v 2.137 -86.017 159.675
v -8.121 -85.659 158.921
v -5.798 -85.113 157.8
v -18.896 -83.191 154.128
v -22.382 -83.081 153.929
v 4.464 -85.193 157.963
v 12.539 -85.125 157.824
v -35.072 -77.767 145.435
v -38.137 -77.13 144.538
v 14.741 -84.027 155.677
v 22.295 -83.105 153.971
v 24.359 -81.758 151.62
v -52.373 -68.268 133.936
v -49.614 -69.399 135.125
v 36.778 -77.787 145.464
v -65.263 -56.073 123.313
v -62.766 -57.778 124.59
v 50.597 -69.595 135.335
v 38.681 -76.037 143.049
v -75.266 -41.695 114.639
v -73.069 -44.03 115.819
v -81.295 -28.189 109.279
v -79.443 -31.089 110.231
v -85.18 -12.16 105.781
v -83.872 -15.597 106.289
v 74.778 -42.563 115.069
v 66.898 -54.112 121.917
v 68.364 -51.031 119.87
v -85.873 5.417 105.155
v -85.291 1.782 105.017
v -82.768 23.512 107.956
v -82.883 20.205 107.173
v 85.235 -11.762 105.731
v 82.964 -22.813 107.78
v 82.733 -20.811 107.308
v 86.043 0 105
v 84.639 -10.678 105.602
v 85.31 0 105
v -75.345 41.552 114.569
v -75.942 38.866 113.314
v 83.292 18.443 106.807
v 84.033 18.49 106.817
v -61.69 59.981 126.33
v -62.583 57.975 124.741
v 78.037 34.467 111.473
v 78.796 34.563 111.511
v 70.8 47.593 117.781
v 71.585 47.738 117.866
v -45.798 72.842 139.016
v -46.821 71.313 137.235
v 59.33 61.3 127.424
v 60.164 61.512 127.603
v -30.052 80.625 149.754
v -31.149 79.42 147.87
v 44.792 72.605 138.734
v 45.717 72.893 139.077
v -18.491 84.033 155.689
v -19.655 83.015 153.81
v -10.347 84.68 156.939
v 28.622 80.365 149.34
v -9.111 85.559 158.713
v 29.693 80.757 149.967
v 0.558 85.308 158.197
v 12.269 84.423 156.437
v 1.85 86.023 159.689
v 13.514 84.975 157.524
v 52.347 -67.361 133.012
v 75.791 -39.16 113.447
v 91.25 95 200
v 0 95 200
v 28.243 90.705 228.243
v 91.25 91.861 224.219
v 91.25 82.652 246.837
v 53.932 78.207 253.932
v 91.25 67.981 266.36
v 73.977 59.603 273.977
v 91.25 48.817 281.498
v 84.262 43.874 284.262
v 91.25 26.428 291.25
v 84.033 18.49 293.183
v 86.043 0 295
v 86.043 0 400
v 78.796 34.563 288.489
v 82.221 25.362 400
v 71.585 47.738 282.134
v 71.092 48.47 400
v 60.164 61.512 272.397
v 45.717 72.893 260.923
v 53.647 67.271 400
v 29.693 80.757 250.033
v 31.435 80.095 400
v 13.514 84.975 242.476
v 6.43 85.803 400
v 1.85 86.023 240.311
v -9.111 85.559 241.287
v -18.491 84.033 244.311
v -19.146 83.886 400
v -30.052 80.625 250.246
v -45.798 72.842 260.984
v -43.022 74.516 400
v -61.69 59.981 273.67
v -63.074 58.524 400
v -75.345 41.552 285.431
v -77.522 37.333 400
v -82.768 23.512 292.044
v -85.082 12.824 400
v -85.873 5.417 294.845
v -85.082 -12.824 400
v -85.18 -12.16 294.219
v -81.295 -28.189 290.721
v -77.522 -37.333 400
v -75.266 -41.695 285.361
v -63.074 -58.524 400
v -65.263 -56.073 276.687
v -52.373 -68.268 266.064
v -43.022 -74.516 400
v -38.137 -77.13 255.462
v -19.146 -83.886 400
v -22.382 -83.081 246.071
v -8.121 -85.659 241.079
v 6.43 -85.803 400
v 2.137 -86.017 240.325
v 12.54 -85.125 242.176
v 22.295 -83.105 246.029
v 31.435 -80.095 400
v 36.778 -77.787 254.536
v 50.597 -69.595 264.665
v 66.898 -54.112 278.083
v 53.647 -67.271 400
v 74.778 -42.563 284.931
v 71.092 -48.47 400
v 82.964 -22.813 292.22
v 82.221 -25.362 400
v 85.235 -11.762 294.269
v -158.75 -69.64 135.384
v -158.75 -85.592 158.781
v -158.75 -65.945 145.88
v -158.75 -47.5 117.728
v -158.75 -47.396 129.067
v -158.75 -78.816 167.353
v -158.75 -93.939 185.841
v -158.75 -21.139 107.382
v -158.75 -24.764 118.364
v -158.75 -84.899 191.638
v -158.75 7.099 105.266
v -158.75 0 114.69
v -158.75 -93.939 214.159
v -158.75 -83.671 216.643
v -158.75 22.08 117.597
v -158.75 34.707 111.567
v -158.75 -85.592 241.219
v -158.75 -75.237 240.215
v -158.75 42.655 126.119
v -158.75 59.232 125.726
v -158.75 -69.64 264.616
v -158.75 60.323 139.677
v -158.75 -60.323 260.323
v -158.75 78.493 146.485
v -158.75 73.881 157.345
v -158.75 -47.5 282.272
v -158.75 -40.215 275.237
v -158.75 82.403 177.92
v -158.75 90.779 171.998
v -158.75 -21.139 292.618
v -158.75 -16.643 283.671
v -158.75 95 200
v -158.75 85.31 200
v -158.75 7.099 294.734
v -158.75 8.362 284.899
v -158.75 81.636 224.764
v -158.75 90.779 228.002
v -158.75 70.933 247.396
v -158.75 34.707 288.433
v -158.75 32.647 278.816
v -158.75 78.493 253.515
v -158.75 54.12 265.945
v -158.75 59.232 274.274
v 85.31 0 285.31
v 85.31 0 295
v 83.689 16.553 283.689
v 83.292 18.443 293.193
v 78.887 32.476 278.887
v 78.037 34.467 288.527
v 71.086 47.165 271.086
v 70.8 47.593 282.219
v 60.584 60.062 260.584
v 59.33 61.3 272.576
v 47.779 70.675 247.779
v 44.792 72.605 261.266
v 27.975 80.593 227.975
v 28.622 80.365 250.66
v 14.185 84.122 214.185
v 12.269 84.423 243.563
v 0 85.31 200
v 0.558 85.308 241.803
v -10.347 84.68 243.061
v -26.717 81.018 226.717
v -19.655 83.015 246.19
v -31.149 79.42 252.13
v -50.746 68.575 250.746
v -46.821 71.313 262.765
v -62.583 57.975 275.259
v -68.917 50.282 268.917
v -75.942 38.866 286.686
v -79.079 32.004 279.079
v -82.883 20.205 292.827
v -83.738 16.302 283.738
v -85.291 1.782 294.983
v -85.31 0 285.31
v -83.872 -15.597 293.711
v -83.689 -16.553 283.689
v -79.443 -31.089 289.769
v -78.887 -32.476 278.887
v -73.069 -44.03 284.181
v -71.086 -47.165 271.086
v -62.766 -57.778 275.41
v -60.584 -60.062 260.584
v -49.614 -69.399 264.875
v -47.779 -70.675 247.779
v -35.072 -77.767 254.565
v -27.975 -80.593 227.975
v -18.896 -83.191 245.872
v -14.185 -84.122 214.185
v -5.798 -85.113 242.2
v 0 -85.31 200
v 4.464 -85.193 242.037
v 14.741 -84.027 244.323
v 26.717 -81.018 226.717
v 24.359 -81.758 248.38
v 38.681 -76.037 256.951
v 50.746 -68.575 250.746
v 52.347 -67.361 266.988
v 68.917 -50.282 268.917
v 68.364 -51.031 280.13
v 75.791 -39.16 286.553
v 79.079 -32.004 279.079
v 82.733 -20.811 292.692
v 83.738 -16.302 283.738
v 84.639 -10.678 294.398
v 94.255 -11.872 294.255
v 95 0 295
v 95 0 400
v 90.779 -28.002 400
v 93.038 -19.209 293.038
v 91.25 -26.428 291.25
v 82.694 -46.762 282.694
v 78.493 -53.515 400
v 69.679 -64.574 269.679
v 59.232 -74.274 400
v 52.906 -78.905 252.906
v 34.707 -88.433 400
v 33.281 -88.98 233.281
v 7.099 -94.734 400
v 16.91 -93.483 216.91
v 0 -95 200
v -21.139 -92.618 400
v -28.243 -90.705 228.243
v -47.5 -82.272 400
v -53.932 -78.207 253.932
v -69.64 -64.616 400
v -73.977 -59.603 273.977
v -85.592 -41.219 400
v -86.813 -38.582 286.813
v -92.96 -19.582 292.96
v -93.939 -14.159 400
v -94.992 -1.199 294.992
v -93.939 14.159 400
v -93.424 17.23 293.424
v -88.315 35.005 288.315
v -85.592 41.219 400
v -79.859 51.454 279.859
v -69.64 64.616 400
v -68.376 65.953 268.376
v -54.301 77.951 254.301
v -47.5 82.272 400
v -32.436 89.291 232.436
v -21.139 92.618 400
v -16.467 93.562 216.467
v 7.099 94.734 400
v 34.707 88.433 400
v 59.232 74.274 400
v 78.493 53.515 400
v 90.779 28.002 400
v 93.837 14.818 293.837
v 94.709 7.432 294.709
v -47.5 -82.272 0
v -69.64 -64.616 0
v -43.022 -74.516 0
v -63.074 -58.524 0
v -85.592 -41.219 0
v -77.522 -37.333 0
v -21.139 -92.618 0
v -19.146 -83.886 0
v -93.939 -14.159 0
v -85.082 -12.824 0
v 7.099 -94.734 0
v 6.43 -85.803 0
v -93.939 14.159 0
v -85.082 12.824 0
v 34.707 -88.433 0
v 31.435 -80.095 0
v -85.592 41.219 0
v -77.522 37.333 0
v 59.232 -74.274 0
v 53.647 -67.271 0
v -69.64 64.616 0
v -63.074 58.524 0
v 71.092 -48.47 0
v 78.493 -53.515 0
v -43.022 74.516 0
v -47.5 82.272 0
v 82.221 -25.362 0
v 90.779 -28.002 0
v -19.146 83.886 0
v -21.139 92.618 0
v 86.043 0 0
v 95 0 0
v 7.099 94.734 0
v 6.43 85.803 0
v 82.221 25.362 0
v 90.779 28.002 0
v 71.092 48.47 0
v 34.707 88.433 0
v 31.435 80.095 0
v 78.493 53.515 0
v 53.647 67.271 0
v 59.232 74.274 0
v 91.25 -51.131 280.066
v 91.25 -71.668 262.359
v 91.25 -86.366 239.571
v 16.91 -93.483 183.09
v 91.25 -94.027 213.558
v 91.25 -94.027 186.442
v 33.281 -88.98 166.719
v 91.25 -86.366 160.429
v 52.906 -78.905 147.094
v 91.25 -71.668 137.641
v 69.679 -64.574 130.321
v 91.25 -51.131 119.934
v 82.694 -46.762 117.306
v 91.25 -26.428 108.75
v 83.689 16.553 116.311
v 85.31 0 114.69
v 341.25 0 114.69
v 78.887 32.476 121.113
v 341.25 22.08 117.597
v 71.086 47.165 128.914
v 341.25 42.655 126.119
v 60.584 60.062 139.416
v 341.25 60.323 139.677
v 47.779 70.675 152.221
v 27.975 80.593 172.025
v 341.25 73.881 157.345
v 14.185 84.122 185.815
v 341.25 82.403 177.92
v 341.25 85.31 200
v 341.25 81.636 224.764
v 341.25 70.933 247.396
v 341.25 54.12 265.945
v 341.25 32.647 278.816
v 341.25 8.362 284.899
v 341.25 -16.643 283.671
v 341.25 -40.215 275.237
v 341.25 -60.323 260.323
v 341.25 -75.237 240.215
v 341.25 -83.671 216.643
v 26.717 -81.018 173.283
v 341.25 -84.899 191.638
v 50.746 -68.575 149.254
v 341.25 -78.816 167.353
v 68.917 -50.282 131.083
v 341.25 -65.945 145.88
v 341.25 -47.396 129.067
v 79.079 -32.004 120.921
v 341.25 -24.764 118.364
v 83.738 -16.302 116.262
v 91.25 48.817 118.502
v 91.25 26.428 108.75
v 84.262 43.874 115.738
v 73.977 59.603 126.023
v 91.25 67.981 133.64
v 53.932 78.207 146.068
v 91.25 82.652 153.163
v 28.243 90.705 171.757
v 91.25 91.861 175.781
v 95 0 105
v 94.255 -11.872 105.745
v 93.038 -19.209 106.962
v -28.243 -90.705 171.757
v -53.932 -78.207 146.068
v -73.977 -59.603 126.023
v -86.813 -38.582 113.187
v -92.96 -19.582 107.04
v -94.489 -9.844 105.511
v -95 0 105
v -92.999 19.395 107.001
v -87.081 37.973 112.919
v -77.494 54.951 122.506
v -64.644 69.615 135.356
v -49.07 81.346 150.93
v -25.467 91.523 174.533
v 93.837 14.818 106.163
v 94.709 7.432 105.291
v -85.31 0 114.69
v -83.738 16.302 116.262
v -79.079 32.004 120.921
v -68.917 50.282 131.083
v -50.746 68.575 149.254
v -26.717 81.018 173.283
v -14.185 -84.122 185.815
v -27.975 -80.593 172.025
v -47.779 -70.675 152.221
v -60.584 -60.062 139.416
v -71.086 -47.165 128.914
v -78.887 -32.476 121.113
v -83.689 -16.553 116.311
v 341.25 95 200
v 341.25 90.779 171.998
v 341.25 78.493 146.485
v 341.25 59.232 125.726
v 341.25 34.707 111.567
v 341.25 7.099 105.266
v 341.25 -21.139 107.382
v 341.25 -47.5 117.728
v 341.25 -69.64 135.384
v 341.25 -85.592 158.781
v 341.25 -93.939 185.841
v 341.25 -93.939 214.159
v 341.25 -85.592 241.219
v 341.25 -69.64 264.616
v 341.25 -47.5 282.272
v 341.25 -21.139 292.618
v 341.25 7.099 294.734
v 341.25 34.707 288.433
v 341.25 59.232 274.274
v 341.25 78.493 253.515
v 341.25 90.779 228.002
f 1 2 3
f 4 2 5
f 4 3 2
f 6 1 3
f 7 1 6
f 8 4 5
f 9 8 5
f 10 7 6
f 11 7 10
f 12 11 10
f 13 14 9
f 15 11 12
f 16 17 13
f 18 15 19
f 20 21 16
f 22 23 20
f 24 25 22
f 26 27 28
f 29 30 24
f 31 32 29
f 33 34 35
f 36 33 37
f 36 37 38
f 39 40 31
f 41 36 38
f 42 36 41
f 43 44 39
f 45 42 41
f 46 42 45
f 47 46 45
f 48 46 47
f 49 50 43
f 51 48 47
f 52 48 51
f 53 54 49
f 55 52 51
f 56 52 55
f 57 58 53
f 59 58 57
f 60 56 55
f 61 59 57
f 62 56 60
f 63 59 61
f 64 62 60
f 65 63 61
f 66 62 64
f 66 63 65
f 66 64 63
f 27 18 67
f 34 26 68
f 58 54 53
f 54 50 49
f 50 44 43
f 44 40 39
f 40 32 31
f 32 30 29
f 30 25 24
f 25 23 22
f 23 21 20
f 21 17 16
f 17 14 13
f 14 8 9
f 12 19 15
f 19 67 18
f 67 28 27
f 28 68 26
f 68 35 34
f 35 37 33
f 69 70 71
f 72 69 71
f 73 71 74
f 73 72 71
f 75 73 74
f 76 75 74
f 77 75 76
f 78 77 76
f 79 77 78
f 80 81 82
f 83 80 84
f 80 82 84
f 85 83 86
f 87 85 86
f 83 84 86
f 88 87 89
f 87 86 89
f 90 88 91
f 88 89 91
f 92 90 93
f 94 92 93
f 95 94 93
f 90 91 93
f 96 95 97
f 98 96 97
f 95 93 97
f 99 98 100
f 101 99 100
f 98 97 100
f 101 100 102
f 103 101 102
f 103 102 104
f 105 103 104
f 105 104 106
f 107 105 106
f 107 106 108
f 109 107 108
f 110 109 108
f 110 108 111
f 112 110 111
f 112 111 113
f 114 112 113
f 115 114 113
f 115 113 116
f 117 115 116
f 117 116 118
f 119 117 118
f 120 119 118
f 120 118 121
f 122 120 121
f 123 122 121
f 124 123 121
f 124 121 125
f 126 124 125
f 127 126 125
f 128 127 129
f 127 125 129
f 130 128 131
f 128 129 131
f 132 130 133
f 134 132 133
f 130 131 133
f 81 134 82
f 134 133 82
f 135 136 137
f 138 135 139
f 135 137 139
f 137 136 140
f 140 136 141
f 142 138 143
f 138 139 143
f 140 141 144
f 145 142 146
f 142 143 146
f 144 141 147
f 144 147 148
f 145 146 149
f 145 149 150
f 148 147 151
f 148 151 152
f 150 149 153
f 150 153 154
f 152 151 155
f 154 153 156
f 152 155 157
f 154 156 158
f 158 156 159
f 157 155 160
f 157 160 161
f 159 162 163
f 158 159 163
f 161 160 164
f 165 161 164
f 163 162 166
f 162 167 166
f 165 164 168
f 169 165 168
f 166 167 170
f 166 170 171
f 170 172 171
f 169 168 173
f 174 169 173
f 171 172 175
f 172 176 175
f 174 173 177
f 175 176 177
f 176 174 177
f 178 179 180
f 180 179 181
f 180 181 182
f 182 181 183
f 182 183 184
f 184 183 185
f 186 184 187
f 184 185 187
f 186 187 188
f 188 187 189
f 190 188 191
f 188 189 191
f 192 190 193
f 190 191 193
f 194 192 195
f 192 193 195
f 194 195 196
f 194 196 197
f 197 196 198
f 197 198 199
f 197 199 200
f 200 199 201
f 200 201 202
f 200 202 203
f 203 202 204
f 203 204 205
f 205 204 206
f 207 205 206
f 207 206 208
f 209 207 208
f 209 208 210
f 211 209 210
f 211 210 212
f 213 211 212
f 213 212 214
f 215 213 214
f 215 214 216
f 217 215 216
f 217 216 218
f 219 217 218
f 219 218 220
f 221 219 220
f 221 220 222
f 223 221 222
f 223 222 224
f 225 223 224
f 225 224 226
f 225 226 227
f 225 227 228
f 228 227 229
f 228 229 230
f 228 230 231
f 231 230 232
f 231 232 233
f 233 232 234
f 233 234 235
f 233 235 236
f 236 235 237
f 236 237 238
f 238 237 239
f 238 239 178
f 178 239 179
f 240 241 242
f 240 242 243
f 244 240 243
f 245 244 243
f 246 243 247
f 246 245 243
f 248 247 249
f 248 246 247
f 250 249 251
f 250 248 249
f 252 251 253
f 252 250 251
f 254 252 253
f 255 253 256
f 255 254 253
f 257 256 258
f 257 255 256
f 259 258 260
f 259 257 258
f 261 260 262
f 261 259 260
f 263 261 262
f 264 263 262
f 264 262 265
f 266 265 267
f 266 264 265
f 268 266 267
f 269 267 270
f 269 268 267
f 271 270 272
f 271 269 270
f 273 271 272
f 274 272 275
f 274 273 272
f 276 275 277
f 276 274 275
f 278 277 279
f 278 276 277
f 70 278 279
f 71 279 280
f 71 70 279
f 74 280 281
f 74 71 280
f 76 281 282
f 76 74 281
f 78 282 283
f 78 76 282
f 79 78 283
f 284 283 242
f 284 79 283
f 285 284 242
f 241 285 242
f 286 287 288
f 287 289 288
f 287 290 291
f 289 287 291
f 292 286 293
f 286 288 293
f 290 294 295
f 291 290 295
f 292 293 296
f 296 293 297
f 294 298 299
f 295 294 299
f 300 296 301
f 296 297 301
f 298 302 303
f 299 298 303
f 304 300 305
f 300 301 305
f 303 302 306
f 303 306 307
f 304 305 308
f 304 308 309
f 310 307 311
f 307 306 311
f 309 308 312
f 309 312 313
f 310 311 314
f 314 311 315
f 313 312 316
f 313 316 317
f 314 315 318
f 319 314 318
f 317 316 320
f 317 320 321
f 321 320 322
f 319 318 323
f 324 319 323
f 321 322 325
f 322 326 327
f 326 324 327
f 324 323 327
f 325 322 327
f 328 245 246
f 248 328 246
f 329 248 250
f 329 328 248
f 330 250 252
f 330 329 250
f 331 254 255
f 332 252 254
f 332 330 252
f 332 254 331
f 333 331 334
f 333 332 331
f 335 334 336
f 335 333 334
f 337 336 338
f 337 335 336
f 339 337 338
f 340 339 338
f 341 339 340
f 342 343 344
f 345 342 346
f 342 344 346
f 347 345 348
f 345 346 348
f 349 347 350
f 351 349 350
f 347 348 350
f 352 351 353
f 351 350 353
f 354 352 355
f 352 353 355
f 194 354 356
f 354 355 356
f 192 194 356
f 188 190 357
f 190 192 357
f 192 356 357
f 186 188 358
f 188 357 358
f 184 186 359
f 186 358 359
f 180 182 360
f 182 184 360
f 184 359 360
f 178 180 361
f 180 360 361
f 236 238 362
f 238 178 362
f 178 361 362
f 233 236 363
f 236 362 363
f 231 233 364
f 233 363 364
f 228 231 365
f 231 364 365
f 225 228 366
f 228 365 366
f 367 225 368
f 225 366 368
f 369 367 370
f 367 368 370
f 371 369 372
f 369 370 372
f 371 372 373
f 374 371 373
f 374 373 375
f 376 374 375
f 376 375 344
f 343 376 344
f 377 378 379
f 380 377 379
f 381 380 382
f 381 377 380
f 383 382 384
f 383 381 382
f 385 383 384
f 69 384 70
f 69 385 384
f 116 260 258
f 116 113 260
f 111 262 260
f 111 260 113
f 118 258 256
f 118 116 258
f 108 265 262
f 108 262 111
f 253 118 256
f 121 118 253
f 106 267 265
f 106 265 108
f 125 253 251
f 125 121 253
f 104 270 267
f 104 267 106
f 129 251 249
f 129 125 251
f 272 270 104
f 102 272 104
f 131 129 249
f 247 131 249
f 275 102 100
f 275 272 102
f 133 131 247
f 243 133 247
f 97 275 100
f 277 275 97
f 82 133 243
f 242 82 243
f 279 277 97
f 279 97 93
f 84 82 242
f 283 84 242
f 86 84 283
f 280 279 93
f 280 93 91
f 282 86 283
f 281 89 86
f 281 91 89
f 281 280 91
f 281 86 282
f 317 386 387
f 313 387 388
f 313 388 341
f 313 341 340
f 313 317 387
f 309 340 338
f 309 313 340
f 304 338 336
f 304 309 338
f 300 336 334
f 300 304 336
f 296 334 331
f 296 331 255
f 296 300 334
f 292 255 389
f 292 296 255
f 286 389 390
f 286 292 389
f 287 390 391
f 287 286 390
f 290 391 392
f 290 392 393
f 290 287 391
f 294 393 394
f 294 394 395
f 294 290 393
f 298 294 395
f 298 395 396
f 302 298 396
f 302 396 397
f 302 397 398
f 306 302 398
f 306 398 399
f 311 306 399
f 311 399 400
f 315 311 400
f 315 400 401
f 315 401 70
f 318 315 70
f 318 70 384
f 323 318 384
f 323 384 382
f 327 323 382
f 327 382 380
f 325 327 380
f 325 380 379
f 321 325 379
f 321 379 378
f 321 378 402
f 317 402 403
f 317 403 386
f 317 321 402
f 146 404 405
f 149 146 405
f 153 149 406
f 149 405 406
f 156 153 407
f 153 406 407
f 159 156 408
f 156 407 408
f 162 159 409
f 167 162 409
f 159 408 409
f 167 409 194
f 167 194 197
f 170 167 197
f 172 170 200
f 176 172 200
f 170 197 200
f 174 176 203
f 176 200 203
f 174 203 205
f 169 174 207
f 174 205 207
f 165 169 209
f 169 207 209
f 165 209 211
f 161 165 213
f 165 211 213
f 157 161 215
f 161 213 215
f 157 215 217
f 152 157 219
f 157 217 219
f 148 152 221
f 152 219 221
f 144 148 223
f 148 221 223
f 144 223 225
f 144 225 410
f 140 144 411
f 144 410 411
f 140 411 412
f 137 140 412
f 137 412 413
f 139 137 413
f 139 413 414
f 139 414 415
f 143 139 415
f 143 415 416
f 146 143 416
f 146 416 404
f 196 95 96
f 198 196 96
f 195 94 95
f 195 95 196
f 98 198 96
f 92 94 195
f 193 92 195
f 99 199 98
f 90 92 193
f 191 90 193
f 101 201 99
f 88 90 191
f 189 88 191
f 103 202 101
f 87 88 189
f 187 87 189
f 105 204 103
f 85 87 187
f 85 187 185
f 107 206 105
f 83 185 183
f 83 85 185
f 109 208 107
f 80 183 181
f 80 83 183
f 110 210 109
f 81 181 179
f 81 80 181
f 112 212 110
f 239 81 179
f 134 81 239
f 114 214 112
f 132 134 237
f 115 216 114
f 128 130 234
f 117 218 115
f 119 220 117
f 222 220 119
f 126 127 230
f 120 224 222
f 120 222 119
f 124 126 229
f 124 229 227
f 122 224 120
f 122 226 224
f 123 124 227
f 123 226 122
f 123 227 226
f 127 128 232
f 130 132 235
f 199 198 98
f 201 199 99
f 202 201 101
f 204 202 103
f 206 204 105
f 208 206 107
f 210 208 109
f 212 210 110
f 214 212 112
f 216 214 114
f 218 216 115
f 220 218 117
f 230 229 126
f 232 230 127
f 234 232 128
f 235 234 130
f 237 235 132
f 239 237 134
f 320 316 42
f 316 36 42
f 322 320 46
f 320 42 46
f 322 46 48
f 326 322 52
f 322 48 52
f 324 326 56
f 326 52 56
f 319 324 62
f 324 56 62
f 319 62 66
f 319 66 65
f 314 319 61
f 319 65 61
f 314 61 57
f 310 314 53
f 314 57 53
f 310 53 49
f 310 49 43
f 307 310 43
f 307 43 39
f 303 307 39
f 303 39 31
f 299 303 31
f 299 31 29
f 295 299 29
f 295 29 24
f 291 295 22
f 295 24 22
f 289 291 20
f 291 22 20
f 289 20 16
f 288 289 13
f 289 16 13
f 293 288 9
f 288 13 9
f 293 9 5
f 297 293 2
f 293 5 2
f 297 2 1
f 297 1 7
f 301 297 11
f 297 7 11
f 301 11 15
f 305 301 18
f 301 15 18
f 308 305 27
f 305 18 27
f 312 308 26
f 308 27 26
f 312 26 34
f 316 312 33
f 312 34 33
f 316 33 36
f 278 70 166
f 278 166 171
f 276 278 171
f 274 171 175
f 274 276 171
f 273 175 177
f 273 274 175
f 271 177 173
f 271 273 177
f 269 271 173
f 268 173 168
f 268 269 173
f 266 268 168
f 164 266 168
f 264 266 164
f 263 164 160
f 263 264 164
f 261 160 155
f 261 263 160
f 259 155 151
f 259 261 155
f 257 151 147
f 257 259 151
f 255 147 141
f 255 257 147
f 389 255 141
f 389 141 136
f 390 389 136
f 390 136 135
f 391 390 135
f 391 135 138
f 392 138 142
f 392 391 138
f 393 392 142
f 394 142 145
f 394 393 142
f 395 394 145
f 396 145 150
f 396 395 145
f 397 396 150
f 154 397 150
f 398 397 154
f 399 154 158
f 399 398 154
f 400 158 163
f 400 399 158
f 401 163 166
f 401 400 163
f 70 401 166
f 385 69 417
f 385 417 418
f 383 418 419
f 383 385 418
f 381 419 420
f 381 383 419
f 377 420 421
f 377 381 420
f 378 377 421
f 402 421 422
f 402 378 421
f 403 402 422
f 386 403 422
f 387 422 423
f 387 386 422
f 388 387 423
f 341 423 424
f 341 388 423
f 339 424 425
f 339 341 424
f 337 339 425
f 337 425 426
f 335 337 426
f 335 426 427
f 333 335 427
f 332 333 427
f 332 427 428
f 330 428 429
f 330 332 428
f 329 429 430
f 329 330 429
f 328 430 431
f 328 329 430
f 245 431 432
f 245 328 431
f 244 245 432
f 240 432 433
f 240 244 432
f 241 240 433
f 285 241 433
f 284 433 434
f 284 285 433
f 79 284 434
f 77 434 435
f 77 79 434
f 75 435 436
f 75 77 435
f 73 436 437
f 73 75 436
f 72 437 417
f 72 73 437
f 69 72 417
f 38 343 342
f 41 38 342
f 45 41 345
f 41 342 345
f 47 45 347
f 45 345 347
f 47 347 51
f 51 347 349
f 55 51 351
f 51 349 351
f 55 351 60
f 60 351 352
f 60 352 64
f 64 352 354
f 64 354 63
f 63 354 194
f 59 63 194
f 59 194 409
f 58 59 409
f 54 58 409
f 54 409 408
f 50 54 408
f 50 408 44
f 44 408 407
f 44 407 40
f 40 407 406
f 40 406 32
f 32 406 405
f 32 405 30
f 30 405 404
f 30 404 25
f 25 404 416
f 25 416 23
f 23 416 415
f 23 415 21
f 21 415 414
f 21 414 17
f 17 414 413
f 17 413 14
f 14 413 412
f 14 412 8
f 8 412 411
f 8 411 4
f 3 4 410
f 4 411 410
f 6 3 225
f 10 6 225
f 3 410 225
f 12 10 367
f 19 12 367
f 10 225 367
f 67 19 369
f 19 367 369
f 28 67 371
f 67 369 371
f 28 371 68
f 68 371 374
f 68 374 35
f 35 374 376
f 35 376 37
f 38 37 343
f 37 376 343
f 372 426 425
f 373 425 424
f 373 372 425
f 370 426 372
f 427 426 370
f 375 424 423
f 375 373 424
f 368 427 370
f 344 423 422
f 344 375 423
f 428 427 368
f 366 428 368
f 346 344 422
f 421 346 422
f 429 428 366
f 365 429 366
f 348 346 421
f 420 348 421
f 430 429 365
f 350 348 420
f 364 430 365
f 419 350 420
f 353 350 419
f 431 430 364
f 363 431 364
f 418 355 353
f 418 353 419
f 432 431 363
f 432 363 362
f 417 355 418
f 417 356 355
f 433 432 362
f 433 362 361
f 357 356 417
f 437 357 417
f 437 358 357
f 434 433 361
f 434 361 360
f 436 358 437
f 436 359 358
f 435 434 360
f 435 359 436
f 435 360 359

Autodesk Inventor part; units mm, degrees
ref_plane "XZ Plane" through (0, 0, 0) normal (0, 1, 0) x (-1, 0, 0)
ref_plane "XY Plane" through (0, 0, 0) normal (0, 0, 1) x (1, 0, 0)
sketch "Boceto1" plane through (0, 0, 0) normal (0, 0, 1) x (1, 0, 0)
  circle A0 centre (0, 0) radius 95
  dimension "d0" = 190
extrude "Extrusión1" add sketch "Boceto1" along normal blind 400
sketch "Boceto2" plane through (0, 0, 400) normal (0, 0, 1) x (1, 0, 0)
  point P0 (0, 0)
sketch "Boceto3" plane through (0, 0, 400) normal (0, 0, 1) x (1, 0, 0)
  circle A0 centre (0, 0) radius 86.0432
extrude "Extrusión2" cut sketch "Boceto3" against normal blind 400
ref_plane "Plano de trabajo2" through (91.25, 0, 0) normal (1, 0, 0) x (0, 1, 0)
sketch "Boceto4" plane through (91.25, 0, 0) normal (1, 0, 0) x (0, 1, 0)
  line L0 (95, 400) -> (-95, 400) construction
  line L1 (0, 400) -> (0, 0) construction
  line L2 (0, 0) -> (0, 400) construction
  line L3 (0, 400) -> (0, 200) construction
  line L4 (95, 0) -> (95, 400) construction
  line L5 (95, 203.9147) -> (-95, 203.9147) construction
  line L6 (-95, 0) -> (-95, 400) construction
  circle A0 centre (0, 200) radius 95
  dimension "d7" = 190
extrude "Extrusión3" add sketch "Boceto4" along normal mid plane 500
sketch "Boceto5" plane through (0, 0, 400) normal (0, 0, 1) x (1, 0, 0)
  circle A0 centre (0, 0) radius 85.3099
extrude "Extrusión4" cut sketch "Boceto5" against normal blind 500
sketch "Boceto6" plane through (341.25, 0, 200) normal (1, 0, 0) x (0, 0, -1)
  circle A0 centre (0, 0) radius 85.3099
  line L0 (-41.7999, 85.3099) -> (41.7999, 85.3099) projected
  point P0 (200, 0)
extrude "Extrusión5" cut sketch "Boceto6" against normal blind 500
